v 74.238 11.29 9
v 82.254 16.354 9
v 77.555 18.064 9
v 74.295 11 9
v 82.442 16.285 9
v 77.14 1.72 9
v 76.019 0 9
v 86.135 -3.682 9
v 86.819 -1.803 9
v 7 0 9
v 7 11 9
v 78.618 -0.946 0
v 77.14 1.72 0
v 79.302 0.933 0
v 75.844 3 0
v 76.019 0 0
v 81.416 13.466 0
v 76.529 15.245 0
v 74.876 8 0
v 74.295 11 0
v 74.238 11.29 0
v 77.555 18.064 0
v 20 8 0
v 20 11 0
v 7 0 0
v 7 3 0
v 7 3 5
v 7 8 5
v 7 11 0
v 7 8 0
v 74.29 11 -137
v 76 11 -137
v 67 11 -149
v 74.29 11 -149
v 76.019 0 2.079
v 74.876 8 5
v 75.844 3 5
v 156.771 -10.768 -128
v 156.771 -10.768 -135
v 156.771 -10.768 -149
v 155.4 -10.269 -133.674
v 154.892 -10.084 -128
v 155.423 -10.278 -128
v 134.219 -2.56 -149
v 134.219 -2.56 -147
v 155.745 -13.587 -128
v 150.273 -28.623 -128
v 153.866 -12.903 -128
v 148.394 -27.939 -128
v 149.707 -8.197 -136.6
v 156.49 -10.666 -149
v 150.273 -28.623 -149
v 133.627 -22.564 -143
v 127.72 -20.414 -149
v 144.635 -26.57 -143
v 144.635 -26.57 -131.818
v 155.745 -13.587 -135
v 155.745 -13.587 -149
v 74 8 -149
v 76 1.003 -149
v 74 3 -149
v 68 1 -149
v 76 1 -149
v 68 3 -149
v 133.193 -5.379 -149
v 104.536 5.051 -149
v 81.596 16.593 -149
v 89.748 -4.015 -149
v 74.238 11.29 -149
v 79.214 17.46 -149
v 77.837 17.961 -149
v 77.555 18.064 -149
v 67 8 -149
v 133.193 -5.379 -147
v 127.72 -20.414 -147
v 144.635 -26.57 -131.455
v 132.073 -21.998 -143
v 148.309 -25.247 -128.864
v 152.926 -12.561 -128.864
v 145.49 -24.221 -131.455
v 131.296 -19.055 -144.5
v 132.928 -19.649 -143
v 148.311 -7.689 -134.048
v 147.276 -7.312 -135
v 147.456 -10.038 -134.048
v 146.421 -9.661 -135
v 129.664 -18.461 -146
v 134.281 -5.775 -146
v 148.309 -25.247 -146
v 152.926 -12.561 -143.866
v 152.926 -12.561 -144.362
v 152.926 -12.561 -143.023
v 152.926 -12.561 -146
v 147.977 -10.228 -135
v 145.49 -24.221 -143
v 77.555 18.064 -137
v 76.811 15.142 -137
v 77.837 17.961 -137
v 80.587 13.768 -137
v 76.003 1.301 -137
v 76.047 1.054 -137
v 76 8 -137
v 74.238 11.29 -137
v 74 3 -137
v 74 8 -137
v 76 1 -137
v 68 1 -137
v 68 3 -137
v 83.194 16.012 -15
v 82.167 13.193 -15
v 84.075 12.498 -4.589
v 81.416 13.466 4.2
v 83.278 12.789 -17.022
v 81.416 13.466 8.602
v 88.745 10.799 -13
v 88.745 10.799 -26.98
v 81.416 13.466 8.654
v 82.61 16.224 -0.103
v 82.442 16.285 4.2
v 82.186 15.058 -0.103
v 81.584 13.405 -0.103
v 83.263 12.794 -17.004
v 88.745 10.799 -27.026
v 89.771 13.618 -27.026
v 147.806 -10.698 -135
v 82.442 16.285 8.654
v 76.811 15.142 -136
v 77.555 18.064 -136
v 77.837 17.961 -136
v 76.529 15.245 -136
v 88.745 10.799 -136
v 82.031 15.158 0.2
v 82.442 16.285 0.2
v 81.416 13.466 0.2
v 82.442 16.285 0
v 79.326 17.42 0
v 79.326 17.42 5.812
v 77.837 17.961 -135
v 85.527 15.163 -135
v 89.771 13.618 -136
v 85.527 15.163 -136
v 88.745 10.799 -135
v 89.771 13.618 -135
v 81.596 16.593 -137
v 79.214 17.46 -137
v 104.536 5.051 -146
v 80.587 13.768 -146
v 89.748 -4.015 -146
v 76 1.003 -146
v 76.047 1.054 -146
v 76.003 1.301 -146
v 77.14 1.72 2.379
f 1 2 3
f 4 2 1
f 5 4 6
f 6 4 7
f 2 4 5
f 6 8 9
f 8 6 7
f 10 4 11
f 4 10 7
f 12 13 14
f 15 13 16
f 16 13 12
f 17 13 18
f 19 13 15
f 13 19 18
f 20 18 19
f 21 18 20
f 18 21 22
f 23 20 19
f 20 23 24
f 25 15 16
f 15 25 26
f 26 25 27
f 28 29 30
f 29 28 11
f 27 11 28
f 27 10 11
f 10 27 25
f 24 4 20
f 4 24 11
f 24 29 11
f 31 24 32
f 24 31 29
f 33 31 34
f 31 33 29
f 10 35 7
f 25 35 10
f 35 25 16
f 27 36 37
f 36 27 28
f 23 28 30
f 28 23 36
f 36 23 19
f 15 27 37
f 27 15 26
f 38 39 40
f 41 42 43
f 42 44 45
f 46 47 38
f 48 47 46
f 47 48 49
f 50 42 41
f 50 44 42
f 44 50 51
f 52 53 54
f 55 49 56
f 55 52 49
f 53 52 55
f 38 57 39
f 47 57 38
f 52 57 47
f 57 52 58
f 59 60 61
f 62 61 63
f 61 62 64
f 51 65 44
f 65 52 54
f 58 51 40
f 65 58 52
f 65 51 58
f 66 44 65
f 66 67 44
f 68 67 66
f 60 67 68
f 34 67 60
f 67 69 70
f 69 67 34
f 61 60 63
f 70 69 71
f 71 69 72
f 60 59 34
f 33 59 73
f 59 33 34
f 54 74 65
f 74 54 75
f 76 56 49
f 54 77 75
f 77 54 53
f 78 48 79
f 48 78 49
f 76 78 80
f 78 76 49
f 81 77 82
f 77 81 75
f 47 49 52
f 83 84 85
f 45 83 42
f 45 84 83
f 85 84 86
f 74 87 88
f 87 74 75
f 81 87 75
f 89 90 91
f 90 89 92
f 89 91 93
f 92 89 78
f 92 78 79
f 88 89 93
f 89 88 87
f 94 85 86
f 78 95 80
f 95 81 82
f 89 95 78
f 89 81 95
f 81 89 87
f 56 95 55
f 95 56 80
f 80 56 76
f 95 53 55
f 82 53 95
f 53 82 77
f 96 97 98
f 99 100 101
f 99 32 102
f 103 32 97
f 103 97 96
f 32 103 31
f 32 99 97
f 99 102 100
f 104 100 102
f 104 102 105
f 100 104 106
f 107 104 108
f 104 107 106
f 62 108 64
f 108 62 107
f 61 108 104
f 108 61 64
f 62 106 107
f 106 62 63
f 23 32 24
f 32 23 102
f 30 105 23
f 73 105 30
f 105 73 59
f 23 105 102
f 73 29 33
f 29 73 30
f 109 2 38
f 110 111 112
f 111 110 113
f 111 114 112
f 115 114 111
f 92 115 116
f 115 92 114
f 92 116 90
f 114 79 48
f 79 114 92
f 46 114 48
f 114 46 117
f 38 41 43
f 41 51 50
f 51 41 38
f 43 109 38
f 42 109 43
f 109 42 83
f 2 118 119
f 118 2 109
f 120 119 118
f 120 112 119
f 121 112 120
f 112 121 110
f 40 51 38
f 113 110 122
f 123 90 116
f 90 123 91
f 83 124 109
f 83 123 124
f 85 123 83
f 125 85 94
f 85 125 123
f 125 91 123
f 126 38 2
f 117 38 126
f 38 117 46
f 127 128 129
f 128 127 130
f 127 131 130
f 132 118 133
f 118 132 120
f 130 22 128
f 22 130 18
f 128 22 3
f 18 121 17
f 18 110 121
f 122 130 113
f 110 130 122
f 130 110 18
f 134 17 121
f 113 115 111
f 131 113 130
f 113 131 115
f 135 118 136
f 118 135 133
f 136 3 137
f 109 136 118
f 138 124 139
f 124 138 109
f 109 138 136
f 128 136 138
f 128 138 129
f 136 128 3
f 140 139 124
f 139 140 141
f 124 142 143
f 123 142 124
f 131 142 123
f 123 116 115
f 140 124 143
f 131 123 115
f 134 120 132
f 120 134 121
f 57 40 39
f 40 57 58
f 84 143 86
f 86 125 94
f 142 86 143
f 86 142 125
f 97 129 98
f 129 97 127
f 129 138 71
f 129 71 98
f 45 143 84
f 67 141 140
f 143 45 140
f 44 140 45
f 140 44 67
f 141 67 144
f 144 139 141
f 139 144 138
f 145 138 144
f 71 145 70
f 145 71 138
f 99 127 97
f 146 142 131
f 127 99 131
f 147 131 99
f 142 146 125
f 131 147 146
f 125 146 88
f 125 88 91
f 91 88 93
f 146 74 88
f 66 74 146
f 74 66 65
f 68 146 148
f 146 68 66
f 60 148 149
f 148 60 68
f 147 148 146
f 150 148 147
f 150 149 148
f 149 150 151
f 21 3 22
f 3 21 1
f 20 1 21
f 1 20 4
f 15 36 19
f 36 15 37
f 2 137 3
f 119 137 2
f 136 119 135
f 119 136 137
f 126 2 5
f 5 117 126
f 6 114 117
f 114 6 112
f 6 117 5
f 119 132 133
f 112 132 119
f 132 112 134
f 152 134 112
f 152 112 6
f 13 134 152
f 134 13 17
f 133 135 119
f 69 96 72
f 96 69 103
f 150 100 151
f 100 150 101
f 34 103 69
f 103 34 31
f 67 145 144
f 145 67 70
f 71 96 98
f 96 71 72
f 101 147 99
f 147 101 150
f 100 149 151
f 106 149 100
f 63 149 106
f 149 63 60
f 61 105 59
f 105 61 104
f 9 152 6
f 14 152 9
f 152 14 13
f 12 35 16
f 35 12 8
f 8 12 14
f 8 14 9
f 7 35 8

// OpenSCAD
phoneLength=155; // 155
phoneWidth=75; // 75
phoneThickness=12; // 12
laptopThickness=5; // 5
clipWidth=70; // 70

/* [Hidden] */
materialThickness=3; // 3
clipHeight=9; // 9


difference() {
        translate([+77-clipWidth,0,0])
    cube([clipWidth,6+laptopThickness,clipHeight]);
    translate([-1,+3,-1])
        cube([1000,+laptopThickness,-3+clipHeight]);
    translate([0,-1,-7])
        cube([0,24+laptopThickness,28]);
  }
//bottom retaining clip
        translate([-8+76,+1,-3+clipHeight-phoneLength])
    cube([6.5,-1+materialThickness,9+materialThickness]);

//Laptop cross-bar
rotate([90,0,0])
translate([0,0,-6-laptopThickness])
linear_extrude(height=materialThickness, center=false, convexity=1, scale=[0], $fn=1)
polygon( points=[
            [77-clipWidth,0],
            [90-clipWidth,0],
            [76,5-phoneLength+13],
            [76,clipHeight-materialThickness-phoneLength],
            [-9+76,clipHeight-materialThickness-phoneLength]] );

//Phone cross-bar
rotate([90,0,0])
rotate([0,-20,0])
translate([-9.3,0,-30-phoneThickness])
linear_extrude(height=materialThickness, center=true, convexity=1, scale=[0], $fn=1)
polygon( points=[
            [82,-15],
            [81,0+clipHeight],
            [9.3+76+phoneWidth,14-phoneLength+13],
            [9.3+76+phoneWidth,9-phoneLength-materialThickness],
            [+9+76+phoneWidth,+9-phoneLength-materialThickness]] );

//Down-bar
rotate([90,0,0])
rotate([0,-20,0])
translate([-9.3,+0.0,-30-phoneThickness])
linear_extrude(height=materialThickness, center=true, convexity=0, scale=[0], $fn=1)
polygon( points=[   [89,-13],
                    [+0+76,clipHeight],
                    [0+76,19-phoneLength],
                    [3+76+10,19-phoneLength]] );
                    
//Phone bottom-bar
rotate([0,0,-20])
translate([-9+76,+28.5+phoneThickness,3-phoneLength+materialThickness])
cube([9+phoneWidth,3,14]);

//Clipbox
difference() {
    rotate([90,0,0])
    rotate([0,-20,0])
    translate([-13,+0,-31.5-phoneThickness])
    linear_extrude(height=+7+phoneThickness, center=false, convexity=0, scale=[0], $fn=1)
    polygon( points=[   [13+phoneWidth+76,0+clipHeight-materialThickness-phoneLength],
                        [13+76+phoneWidth,27-phoneLength],
                [+11+76+phoneWidth,27-phoneLength],
                [-11+76+phoneWidth,+2+clipHeight-materialThickness-phoneLength],
                    [-11+76+phoneWidth,+0+clipHeight-materialThickness-phoneLength]

    ] );
                
    rotate([0,0,-20])
    translate([62.0,+27,3+clipHeight-phoneLength-materialThickness])
    cube([+11+phoneWidth,+2+phoneThickness,+27]);
    rotate([0,0,-20])
        translate([26,8,26-phoneLength])
    cube([-3+phoneWidth,6+phoneThickness,11]);
    // visible cutout
            rotate([0,0,-20])
        translate([-4+76,+24,+12-phoneLength])
    cube([-2+phoneWidth,+5,25]);
}

//bottom left phone rest
rotate([0,0,-17])
        translate([-2,+10.1,10.5-phoneLength-materialThickness])
    linear_extrude(height=3, center=true, convexity=0, scale=[0], $fn=1)
    polygon( points=[   [-2+76,13.1],
                        [13.0+76,12.3],
                [26+76,15+phoneThickness],
                [-4+76,17+phoneThickness],]);
                
//left phone face/chamfer
//top phoneThickness bracket
rotate([0,0,-20])
    linear_extrude(height=9.0, convexity=0, scale=[0], $fn=1)
    polygon( points=[   [-9.3+76,31.5+phoneThickness],
                        [-4.1+76,31.5+phoneThickness],
                [-4.1+76,+26.0],
                [-10.1+76,+36],
                ] );
//top laptopThickness bracket
    linear_extrude(height=9.0, convexity=0, scale=[0], $fn=1)

    polygon( points=[   [+0+76,6+laptopThickness],
                        [2+76,4.3+laptopThickness],
                [+0+76,+1],
//                [-3+76,+8],
                ] );
//bottom phoneThickness bracket
translate([0,0,6-phoneLength])
rotate([0,0,-20])
    linear_extrude(height=12.0, convexity=0, scale=[0], $fn=1)

    polygon( points=[   [-9.3+76,31.5+phoneThickness],
                        [-5+76,31.5+phoneThickness],
                [-4.9+76,+27.0],
                [-10.1+76,+36],
                ] );

//bottom laptopThickness bracket
translate([0,0,+6-phoneLength])
    linear_extrude(height=12.0, convexity=0, scale=[0], $fn=1)
    polygon( points=[   [-2+76,6+laptopThickness],
                        [0.1+76,+6.0+laptopThickness],
                [+0+76,+1],
                [-2+76,+1],
                ] );

//top phone retainer
rotate([90,0,0])
rotate([0,-20,0])
        translate([+2.2,-6,-27])
    linear_extrude(height=2, center=true, convexity=0, scale=[0], $fn=1)
    polygon( points=[   [-10+76,-3+clipHeight],
                        [-4+76,-3+clipHeight],
                        [+4+76,6+clipHeight],
                [-10+76,6+clipHeight],] );
                
                
////pixel6a
//color([0.3,0.3,0.3])
//rotate([0,0,+70])
//translate([28,4-phoneWidth-76,+9-phoneLength])
//cube([phoneThickness,phoneWidth,phoneLength]);
////screen
//color([0.1,+0.1,0.1],0.8)
//rotate([0,0,+70])
//translate([27.8,7-phoneWidth-76,+12-phoneLength])
//cube([phoneThickness,-6+phoneWidth,-6+phoneLength]);
//
////laptop top
//color("Grey")
//rotate([0,0,90])
//translate([+3.0,-75-phoneWidth+76,-295])
//cube([laptopThickness,400,300]);
////screen
//color([0.1,+0.1,0.1],1.8)
//rotate([0,0,90])
//translate([+2.9,-66-phoneWidth+76,-276])
//cube([laptopThickness,380,270]);
////laptop bottom
//color("Grey")
//rotate([0,77,90])
//translate([+278,+1-phoneWidth,-373])
//cube([20,399,317]);
